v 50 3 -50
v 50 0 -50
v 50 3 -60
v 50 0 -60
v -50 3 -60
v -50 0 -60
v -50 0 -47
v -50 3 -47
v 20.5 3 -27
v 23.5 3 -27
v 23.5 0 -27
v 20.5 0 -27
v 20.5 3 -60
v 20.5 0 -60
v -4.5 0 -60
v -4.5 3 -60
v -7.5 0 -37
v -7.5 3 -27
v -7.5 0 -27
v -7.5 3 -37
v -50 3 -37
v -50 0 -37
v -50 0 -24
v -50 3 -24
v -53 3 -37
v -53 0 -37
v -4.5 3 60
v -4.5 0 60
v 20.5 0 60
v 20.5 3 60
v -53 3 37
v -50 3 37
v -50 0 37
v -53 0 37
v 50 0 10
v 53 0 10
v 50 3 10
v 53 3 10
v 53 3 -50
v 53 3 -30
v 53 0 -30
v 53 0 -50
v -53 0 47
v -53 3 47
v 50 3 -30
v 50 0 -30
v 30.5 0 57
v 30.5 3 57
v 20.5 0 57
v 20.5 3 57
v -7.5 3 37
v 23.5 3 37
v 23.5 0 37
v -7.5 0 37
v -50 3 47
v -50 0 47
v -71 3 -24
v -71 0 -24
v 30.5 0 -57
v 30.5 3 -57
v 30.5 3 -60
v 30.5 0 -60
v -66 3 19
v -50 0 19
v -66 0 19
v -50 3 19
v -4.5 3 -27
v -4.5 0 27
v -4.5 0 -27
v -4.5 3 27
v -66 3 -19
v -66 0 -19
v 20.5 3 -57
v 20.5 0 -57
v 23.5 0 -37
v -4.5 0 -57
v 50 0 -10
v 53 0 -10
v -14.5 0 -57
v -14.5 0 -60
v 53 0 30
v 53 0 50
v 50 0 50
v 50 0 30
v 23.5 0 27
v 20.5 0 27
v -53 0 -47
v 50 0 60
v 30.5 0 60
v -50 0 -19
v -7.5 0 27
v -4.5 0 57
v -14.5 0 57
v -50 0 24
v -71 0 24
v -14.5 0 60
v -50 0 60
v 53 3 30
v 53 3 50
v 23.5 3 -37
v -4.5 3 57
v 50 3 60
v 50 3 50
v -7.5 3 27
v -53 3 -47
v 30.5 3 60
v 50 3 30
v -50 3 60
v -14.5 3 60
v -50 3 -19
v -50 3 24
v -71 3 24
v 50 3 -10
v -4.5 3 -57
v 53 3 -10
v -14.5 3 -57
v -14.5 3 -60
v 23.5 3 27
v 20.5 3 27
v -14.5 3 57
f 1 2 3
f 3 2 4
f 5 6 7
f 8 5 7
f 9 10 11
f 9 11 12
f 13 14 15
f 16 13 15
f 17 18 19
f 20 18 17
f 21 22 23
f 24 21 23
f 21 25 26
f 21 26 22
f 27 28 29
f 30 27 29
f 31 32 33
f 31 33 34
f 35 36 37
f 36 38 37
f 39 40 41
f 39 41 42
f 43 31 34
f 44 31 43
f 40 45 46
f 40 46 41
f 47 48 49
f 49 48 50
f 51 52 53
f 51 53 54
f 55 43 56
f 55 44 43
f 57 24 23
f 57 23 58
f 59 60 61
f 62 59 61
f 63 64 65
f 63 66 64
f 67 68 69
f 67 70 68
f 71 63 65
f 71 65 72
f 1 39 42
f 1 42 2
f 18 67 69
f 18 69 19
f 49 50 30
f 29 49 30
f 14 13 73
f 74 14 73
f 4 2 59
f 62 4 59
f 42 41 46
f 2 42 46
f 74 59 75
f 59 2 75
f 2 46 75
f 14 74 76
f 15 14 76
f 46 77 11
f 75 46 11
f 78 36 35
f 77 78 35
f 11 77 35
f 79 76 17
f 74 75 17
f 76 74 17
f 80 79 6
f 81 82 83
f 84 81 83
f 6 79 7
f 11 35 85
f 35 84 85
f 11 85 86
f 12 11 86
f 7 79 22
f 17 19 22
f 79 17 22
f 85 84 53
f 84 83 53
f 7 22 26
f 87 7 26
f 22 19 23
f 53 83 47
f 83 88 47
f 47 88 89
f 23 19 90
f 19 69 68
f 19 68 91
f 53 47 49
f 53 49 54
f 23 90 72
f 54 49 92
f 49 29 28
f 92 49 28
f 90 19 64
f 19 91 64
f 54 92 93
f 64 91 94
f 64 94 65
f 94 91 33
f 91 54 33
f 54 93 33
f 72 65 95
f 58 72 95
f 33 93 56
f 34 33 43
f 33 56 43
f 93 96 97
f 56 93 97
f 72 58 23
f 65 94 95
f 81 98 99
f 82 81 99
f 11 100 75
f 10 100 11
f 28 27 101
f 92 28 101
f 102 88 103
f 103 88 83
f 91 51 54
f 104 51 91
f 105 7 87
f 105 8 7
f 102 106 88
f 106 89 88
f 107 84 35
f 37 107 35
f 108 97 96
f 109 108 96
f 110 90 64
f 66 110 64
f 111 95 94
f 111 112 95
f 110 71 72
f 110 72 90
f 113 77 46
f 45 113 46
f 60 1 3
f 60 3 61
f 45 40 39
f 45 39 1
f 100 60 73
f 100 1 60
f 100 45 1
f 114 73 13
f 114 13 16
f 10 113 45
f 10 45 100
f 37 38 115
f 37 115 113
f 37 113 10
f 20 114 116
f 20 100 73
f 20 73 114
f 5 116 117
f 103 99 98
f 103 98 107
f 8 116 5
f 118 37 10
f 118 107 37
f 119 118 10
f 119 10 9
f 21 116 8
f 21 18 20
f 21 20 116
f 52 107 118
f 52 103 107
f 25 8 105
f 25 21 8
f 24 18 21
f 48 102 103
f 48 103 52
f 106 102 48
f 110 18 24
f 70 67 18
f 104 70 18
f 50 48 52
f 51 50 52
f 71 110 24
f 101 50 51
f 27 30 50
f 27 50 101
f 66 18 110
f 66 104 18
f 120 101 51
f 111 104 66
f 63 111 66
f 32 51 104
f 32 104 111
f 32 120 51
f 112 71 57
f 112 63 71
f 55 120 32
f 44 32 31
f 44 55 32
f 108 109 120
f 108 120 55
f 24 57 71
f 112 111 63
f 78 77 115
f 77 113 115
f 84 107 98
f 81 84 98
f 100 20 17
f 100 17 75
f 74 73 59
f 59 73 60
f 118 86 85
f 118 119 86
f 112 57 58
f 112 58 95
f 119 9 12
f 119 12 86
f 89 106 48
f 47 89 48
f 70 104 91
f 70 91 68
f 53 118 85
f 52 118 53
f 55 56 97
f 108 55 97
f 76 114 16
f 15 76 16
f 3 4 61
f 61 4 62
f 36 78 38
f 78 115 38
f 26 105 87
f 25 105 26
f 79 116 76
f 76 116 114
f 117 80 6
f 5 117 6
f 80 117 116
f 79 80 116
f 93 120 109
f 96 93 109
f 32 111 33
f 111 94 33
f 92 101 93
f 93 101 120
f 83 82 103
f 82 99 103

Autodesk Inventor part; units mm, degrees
ref_plane "YZ Plane" through (0, 0, 0) normal (1, 0, 0) x (0, 1, 0)
ref_plane "XZ Plane" through (0, 0, 0) normal (0, 1, 0) x (-1, 0, 0)
ref_plane "XY Plane" through (0, 0, 0) normal (0, 0, 1) x (1, 0, 0)
sketch "Sketch1" plane through (0, 0, 0) normal (0, 1, 0) x (-1, 0, 0)
  line L0 (50, 60) -> (-50, 60)
  line L1 (-50, 60) -> (-50, -60)
  line L2 (-50, -60) -> (50, -60)
  line L3 (50, -60) -> (50, 60)
  line L4 (50, 60) -> (-50, -60) construction
  line L5 (-50, 60) -> (50, -60) construction
  point P0 (0, 0)
  dimension "d0" = 60
  dimension "d1" = 100
extrude "Extrusion1" add sketch "Sketch1" along normal blind 3
sketch "Sketch2" plane through (0, 3, 0) normal (0, 1, 0) x (1, 0, 0)
  line L0 (-50, -60) -> (50, -60) projected
  line L1 (-14.5, -60) -> (-4.5, -60)
  line L2 (-4.5, -60) -> (-4.5, -57)
  line L3 (-4.5, -57) -> (-14.5, -57)
  line L4 (-14.5, -57) -> (-14.5, -60)
  line L5 (50, -60) -> (50, 60) projected
  line L6 (20.5, -60) -> (30.5, -60)
  line L7 (30.5, -60) -> (30.5, -57)
  line L8 (30.5, -57) -> (20.5, -57)
  line L9 (20.5, -57) -> (20.5, -60)
  line L10 (-4.5, -37) -> (-7.5, -37)
  line L11 (-7.5, -37) -> (-7.5, -27)
  line L12 (-7.5, -27) -> (-4.5, -27)
  line L13 (-4.5, -27) -> (-4.5, -37)
  line L14 (20.5, -27) -> (23.5, -27)
  line L15 (23.5, -27) -> (23.5, -37)
  line L16 (23.5, -37) -> (20.5, -37)
  line L17 (20.5, -37) -> (20.5, -27)
  point P0 (0, 0)
  dimension "d4" = 10
  dimension "d5" = 3
  dimension "d6" = 54.5
  dimension "d7" = 10
  dimension "d8" = 3
  dimension "d9" = 25
  dimension "d10" = 3
  dimension "d11" = 10
  dimension "d12" = 30
  dimension "d13" = 3
  dimension "d14" = 10
extrude "Extrusion2" cut sketch "Sketch2" against normal blind 3
sketch "Sketch3" plane through (0, 3, 0) normal (0, 1, 0) x (1, 0, 0)
  line L0 (50, -60) -> (50, 60) projected
  line L1 (50, 10) -> (53, 10)
  line L2 (53, 10) -> (53, -10)
  line L3 (53, -10) -> (50, -10)
  line L4 (50, -10) -> (50, 10)
  line L5 (50, -30) -> (53, -30)
  line L6 (53, -30) -> (53, -50)
  line L7 (53, -50) -> (50, -50)
  line L8 (50, -50) -> (50, -30)
  line L9 (50, 30) -> (53, 30)
  line L10 (53, 30) -> (53, 50)
  line L11 (53, 50) -> (50, 50)
  line L12 (50, 50) -> (50, 30)
  point P0 (0, 0)
  point P1 (53, 0)
  dimension "d17" = 3
  dimension "d18" = 20
  dimension "d19" = 3
  dimension "d20" = 20
  dimension "d21" = 20
  dimension "d22" = 20
extrude "Extrusion3" add sketch "Sketch3" against normal blind 3
sketch "Sketch4" plane through (0, 3, 0) normal (0, 1, 0) x (1, 0, 0)
  line L0 (-50, 60) -> (-50, -60) projected
  line L1 (-50, 24) -> (-71, 24)
  line L2 (-71, 24) -> (-71, -24)
  line L3 (-71, -24) -> (-50, -24)
  line L4 (-50, -24) -> (-50, 24)
  line L5 (-50, -19) -> (-66, -19)
  line L6 (-66, -19) -> (-66, 19)
  line L7 (-66, 19) -> (-50, 19)
  line L8 (-50, 19) -> (-50, -19)
  point P0 (0, 0)
  point P1 (-71, 0)
  point P2 (-66, 0)
  dimension "d27" = 38
  dimension "d28" = 16
  dimension "d29" = 5
  dimension "d30" = 5
extrude "Extrusion4" add sketch "Sketch4" against normal blind 3 contours L0 L7 L6 L5 L3 L2 L1
sketch "Sketch6" plane through (0, 3, 0) normal (0, 1, 0) x (1, 0, 0)
  line L0 (-50, 60) -> (-50, 24) projected
  line L1 (-50, 47) -> (-53, 47)
  line L2 (-53, 47) -> (-53, 37)
  line L3 (-53, 37) -> (-50, 37)
  line L4 (-50, 37) -> (-50, 47)
  line L5 (-50, 24) -> (-71, 24) projected
  point P0 (0, 0)
  dimension "d39" = 3
  dimension "d40" = 10
  dimension "d41" = 13
  dimension "d42" = 13
extrude "Extrusion6" add sketch "Sketch6" against normal blind 3
sketch "Sketch8" plane through (0, 3, 0) normal (0, 1, 0) x (1, 0, 0)
  line L0 (20.5, -37) -> (-4.5, -37)
  line L1 (-4.5, -37) -> (-4.5, 37)
  line L2 (-4.5, 37) -> (20.5, 37)
  line L3 (20.5, 37) -> (20.5, -37)
  line L4 (-4.5, -27) -> (-4.5, -37) projected
  point P0 (0, 0)
  point P1 (20.5, 0)
extrude "Extrusion7" cut sketch "Sketch8" against normal blind 3
mirror "Mirror1" about plane through (0, 0, 0) normal (0, 0, 1) of "Extrusion2"
mirror "Mirror2" about plane through (0, 0, 0) normal (0, 0, 1) of "Extrusion6"
equation "\"d30\" = d29"
equation "\"d41\" = d42"
properties part number "Mid Plate"
